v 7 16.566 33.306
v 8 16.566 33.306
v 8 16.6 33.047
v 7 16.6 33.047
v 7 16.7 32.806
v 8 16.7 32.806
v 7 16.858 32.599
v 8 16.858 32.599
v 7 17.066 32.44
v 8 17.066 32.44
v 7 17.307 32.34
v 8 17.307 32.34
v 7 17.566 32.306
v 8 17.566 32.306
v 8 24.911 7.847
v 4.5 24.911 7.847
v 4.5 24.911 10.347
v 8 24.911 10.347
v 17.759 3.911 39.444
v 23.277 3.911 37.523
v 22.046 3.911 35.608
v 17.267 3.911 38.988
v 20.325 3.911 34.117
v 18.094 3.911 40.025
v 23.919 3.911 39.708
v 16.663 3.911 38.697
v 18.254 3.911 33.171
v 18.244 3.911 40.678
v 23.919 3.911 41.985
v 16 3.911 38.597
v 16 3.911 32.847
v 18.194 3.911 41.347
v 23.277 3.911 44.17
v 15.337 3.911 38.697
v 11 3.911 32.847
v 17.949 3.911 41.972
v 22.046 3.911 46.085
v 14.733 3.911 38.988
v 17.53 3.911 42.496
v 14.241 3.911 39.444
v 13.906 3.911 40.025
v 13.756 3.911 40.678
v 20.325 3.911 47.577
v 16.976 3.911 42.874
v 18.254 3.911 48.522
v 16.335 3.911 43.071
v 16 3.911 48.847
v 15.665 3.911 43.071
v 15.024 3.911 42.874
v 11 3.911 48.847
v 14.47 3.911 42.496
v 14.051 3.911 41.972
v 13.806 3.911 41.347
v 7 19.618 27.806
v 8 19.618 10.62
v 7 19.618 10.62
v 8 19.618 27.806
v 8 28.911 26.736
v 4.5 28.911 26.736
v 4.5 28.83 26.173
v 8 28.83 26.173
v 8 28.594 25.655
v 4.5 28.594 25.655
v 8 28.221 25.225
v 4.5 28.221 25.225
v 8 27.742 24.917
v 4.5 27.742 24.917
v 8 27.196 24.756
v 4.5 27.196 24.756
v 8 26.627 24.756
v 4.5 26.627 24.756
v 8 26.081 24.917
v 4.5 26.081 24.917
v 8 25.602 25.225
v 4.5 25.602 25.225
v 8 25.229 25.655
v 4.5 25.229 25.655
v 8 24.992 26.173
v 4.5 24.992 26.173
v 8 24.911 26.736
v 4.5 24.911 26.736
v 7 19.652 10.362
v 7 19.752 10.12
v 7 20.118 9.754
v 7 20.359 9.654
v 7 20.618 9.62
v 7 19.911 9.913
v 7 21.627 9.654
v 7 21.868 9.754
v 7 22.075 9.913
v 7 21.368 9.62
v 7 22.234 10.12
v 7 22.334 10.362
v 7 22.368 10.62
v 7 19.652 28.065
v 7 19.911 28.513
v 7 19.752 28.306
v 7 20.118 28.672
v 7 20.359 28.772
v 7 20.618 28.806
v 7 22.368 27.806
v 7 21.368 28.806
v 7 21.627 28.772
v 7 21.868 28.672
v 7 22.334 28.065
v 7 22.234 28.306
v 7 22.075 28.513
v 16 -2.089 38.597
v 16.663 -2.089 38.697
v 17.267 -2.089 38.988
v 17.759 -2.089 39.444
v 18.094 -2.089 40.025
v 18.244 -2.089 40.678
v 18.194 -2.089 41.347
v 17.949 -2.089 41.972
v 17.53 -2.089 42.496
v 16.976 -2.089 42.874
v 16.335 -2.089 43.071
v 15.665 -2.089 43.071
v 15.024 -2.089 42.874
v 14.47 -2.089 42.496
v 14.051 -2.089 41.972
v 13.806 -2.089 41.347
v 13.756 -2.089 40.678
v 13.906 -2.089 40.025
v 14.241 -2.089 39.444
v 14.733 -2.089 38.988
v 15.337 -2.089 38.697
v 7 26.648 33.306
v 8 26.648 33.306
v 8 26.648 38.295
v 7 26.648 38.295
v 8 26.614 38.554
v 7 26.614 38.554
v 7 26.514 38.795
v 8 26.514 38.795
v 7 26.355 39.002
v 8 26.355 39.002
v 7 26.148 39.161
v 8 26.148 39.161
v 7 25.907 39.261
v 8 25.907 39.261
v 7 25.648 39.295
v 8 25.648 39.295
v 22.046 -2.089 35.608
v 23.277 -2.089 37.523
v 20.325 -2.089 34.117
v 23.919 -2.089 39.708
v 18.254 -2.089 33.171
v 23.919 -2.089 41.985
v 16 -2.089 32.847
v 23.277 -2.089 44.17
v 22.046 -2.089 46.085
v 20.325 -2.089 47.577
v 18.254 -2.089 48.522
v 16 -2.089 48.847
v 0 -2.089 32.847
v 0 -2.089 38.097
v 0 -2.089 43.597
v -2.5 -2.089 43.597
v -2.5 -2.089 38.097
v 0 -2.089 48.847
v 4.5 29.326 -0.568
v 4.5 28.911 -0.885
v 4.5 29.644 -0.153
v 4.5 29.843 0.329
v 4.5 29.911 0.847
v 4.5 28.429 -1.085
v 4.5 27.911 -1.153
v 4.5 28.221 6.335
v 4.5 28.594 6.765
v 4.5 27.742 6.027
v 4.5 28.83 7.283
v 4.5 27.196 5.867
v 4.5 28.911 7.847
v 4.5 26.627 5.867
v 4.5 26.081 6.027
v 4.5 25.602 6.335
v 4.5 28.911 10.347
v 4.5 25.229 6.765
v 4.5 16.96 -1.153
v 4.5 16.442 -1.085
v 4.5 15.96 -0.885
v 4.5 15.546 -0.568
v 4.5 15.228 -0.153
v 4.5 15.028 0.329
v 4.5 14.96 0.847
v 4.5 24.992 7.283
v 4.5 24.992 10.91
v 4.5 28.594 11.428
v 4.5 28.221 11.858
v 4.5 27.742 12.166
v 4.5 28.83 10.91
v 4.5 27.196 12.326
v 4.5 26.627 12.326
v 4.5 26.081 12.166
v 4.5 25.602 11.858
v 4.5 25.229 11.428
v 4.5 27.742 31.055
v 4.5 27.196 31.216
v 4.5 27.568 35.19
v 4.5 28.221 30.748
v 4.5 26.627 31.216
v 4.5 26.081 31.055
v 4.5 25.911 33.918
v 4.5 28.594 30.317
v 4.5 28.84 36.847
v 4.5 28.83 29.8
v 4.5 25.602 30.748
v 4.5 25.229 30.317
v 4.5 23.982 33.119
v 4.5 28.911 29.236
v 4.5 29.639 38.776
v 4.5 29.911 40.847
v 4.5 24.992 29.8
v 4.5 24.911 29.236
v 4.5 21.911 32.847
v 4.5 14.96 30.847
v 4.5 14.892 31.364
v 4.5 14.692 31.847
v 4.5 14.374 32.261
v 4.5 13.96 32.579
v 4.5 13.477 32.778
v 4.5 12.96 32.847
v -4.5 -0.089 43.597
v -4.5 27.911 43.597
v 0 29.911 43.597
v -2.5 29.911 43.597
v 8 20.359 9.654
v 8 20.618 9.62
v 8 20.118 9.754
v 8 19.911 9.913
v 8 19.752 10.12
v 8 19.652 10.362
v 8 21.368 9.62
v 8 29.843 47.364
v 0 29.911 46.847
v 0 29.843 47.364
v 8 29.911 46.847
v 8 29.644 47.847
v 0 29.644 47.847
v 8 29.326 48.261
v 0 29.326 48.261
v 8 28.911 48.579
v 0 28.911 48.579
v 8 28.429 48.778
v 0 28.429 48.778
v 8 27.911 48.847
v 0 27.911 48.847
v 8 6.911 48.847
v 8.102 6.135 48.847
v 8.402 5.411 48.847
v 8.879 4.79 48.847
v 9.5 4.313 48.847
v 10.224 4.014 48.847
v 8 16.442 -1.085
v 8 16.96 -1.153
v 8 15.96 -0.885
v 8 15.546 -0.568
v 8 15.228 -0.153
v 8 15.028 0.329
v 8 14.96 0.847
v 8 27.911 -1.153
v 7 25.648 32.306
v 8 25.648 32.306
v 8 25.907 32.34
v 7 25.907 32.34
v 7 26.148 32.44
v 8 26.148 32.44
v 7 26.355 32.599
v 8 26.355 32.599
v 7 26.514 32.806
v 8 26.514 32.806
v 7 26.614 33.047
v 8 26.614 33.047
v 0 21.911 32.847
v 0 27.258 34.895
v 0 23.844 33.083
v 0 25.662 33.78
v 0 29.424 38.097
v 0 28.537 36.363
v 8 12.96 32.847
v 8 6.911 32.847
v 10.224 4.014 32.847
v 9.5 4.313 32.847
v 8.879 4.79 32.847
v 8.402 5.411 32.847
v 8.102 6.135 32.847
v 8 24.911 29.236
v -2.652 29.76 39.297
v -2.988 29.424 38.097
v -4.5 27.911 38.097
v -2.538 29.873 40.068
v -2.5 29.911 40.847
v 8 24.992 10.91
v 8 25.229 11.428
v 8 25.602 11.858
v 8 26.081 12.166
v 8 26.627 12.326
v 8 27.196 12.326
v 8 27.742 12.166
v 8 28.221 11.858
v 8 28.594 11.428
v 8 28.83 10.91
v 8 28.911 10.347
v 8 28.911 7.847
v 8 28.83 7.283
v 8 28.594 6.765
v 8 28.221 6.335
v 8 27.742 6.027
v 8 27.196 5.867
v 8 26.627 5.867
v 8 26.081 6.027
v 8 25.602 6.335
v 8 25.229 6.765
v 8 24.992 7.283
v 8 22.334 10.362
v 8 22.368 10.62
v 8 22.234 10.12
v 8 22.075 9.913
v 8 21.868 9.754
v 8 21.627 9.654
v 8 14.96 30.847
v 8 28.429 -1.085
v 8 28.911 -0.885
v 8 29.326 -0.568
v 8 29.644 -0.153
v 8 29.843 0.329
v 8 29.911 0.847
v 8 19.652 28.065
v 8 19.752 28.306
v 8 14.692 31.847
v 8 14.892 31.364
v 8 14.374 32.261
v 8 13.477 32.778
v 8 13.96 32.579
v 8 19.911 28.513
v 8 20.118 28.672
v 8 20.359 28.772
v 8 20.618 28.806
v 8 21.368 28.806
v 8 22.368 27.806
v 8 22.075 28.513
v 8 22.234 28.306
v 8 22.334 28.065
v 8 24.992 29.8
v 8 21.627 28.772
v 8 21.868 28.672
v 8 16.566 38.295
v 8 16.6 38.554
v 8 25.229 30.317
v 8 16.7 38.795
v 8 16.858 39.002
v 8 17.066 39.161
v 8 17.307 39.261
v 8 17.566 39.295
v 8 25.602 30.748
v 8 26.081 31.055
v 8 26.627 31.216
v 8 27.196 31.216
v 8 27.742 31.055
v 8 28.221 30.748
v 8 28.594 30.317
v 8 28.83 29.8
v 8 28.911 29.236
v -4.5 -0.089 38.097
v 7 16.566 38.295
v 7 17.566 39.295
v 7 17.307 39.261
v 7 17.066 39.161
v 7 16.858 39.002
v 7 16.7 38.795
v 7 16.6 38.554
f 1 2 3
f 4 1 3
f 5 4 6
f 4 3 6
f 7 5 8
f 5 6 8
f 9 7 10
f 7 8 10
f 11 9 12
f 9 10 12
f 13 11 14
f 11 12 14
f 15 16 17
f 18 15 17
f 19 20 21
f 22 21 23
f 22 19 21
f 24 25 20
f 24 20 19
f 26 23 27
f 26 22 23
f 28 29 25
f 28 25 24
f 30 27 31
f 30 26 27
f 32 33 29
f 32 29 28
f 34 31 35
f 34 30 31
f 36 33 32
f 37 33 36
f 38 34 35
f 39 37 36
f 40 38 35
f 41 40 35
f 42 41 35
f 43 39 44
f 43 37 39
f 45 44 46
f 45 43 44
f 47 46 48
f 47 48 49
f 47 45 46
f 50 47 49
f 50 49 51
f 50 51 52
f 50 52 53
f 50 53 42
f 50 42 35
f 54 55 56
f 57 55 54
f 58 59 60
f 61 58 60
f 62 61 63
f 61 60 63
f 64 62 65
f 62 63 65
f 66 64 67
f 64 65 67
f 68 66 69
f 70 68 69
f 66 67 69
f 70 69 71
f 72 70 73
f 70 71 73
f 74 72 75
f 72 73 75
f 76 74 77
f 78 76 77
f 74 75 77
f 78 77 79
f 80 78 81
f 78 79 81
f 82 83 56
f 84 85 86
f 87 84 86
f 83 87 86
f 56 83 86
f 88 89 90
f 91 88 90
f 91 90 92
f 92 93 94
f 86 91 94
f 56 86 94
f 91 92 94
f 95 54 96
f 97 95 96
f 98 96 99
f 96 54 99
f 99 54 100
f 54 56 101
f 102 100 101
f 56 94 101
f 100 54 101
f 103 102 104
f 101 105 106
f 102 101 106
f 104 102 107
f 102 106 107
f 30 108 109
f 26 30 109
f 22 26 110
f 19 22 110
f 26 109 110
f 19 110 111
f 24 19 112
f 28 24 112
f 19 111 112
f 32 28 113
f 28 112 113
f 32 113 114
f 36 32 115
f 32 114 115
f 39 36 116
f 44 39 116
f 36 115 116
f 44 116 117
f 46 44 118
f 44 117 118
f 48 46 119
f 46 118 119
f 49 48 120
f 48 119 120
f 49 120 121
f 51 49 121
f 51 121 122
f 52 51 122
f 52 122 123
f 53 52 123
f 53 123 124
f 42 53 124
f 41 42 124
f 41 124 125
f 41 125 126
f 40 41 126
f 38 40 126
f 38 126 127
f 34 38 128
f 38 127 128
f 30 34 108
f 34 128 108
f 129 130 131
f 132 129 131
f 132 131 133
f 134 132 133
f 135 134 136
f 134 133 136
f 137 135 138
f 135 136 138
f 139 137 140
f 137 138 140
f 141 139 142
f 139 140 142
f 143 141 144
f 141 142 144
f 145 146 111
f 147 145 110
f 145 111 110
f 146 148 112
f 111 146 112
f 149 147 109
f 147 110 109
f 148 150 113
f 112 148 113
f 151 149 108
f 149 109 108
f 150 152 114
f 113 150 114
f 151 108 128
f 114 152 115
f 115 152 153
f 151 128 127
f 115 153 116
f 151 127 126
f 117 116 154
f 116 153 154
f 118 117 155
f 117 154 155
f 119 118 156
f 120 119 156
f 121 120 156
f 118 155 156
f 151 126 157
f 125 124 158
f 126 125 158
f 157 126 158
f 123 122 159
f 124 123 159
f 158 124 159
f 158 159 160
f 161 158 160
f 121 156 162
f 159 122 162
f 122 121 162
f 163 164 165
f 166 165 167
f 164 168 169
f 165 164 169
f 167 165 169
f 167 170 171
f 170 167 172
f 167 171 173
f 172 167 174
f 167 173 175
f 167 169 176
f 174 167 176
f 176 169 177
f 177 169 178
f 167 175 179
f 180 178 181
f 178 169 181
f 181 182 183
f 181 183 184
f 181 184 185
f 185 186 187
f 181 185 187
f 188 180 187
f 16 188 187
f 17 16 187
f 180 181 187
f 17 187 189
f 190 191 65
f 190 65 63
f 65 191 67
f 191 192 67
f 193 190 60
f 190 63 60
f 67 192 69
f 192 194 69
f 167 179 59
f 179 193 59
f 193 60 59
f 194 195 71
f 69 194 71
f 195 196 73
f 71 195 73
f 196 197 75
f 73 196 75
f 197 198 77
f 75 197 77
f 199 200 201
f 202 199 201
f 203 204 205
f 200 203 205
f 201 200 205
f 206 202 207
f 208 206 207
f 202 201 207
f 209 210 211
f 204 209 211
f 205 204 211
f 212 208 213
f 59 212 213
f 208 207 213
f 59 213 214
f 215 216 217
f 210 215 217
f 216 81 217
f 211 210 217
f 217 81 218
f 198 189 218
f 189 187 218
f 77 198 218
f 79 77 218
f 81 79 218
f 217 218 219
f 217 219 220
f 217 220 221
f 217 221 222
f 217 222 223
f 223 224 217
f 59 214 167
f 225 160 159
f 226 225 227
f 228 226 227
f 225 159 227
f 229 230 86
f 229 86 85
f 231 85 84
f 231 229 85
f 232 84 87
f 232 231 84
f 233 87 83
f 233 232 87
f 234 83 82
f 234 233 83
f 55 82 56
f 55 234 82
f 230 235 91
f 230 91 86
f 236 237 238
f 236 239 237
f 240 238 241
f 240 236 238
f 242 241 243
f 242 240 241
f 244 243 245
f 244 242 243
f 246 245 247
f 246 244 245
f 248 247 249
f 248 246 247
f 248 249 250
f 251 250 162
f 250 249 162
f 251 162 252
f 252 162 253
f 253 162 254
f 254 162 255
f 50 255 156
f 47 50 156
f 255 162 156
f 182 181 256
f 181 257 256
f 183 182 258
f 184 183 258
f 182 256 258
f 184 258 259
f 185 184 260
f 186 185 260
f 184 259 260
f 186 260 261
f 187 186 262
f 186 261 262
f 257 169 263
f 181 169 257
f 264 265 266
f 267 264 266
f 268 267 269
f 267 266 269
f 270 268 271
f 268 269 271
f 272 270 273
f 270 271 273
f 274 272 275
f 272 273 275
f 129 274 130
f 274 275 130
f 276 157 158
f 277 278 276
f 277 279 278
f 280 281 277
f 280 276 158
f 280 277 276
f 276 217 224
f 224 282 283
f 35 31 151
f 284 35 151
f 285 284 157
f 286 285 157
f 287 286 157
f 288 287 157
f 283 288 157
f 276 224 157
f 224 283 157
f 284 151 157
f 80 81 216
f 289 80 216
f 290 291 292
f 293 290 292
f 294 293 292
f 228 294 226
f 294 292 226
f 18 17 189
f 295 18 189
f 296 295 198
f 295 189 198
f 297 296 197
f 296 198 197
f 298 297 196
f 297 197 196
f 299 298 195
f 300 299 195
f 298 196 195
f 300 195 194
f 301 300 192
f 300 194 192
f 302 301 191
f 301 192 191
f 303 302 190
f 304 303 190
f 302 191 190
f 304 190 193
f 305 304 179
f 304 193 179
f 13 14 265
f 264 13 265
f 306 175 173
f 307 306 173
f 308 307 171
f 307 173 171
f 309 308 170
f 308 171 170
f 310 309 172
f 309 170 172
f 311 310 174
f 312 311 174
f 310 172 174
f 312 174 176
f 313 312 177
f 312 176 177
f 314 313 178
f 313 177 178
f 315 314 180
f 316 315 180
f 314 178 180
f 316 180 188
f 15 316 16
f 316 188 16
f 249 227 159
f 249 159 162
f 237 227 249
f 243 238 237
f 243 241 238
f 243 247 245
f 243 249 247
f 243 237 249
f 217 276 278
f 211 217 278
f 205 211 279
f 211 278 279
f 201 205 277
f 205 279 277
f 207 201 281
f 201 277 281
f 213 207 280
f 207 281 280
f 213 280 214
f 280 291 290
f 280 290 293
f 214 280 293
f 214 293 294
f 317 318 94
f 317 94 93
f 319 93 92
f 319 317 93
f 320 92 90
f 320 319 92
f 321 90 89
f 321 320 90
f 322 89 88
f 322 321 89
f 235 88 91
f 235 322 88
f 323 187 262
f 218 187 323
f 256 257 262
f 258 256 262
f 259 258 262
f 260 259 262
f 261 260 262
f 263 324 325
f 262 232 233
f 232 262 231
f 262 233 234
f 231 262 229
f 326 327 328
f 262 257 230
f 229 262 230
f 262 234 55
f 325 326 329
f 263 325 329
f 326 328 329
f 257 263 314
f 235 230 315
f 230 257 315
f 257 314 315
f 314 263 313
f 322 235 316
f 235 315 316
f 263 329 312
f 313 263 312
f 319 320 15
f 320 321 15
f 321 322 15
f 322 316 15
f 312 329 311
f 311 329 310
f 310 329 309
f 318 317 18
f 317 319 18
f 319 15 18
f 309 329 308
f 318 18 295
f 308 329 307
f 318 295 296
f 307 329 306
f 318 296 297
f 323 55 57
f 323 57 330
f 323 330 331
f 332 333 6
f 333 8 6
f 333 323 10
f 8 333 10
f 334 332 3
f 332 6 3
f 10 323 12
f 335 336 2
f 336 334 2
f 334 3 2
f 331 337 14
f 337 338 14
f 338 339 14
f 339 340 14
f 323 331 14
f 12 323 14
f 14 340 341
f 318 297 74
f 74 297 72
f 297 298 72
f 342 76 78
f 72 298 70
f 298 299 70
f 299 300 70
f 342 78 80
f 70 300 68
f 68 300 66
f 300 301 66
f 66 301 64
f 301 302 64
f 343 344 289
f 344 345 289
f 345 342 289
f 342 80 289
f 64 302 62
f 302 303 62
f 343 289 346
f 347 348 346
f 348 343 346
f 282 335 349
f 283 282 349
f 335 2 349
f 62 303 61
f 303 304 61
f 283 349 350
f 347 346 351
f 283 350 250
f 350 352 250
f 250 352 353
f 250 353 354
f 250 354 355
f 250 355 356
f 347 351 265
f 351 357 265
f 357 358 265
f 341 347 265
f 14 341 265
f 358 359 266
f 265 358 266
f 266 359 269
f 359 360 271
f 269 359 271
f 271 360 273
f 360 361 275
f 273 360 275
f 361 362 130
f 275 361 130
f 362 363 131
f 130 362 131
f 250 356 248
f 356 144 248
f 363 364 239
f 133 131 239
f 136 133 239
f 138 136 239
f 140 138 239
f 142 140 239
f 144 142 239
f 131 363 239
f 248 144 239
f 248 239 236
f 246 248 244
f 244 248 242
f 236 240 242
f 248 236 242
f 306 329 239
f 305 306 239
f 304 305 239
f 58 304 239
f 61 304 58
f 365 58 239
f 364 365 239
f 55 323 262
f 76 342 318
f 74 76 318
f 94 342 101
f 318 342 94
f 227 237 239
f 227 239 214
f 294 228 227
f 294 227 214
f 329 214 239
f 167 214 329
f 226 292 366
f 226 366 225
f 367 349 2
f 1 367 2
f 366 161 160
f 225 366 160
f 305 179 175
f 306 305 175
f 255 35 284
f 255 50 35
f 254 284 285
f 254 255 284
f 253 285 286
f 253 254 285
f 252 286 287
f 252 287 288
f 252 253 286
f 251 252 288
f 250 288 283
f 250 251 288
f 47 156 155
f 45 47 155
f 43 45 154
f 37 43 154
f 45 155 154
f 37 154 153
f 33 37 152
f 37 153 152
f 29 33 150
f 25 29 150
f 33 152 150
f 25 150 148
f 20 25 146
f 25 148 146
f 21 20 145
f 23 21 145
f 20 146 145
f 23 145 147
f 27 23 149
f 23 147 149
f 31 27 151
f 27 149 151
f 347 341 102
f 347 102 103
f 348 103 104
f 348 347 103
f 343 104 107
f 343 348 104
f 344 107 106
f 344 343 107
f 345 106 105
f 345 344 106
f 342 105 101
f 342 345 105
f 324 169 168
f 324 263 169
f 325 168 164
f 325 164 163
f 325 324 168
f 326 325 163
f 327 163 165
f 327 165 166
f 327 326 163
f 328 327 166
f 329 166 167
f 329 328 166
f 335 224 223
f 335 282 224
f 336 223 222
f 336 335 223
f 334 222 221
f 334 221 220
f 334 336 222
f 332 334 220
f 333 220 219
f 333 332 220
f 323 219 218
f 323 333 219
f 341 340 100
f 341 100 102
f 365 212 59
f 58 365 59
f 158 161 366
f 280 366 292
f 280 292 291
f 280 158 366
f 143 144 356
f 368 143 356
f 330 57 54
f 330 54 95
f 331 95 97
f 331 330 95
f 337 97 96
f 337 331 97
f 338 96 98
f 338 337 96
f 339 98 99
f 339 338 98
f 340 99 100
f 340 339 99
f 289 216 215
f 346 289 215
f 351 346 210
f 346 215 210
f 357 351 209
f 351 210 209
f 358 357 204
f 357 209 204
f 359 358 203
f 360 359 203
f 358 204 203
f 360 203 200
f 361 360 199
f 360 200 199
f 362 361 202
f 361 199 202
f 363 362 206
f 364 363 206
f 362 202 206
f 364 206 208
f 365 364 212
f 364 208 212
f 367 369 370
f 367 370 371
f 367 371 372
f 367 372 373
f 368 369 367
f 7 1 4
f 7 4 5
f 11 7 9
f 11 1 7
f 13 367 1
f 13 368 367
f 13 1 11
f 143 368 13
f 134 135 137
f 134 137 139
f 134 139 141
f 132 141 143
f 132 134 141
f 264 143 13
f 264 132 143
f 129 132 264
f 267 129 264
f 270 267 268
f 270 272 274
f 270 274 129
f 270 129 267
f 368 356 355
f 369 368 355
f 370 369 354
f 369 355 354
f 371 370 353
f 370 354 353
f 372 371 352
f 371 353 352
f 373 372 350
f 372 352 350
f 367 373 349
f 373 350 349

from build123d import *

# Parameters (mm, degrees)
BOSS_EXTRUDE1_DEPTH = 8
SKETCH2_W           = 5.5
SKETCH2_H           = 32
BOSS_EXTRUDE2_DEPTH = 4.5
CUT_EXTRUDE2_DEPTH  = 1
SKETCH5_W           = 4.5
SKETCH5_H           = 34
CUT_EXTRUDE3_DEPTH  = 53.351043088
FILLET4_R           = 2
CHAMFER1_SIZE       = 2
SKETCH6_R           = 2.25
BOSS_EXTRUDE3_DEPTH = 6
FILLET5_R           = 8
FILLET6_R           = 3


with BuildPart() as part:
    # Sketch1 → Boss-Extrude1 (new body)
    with BuildSketch(Plane(origin=(0, 0, 0), x_dir=(0, 0, -1), z_dir=(1, 0, 0))):
        Polygon((-32.846556001, 14.959797641), (-32.846556001, -2.08853598), (-48.846556001, -2.08853598), (-48.846556001, 29.91146402), (1.153443999, 29.91146402), (1.153443999, 14.959797641), align=None)
        with BuildLine():
            Line((-29.23609438, 28.91146402), (-26.73609438, 28.91146402))
            ThreePointArc((-26.73609438, 28.91146402), (-24.73609438, 26.91146402), (-26.73609438, 24.91146402))
            Line((-26.73609438, 24.91146402), (-29.23609438, 24.91146402))
            ThreePointArc((-29.23609438, 24.91146402), (-31.23609438, 26.91146402), (-29.23609438, 28.91146402))
        make_face(mode=Mode.SUBTRACT)
        with BuildLine():
            Line((-10.346556001, 28.91146402), (-7.846556001, 28.91146402))
            ThreePointArc((-7.846556001, 28.91146402), (-5.846556001, 26.91146402), (-7.846556001, 24.91146402))
            Line((-7.846556001, 24.91146402), (-10.346556001, 24.91146402))
            ThreePointArc((-10.346556001, 24.91146402), (-12.346556001, 26.91146402), (-10.346556001, 28.91146402))
        make_face(mode=Mode.SUBTRACT)
    extrude(amount=BOSS_EXTRUDE1_DEPTH)

    # Sketch2 → Boss-Extrude2 (add)
    with BuildSketch(Plane.ZY):
        with Locations((40.846556001, 13.91146402)):
            Rectangle(SKETCH2_W, SKETCH2_H)
    extrude(amount=BOSS_EXTRUDE2_DEPTH)

    # Sketch4 → Cut-Extrude2 (cut)
    with BuildSketch(Plane(origin=(8, 0, 0), x_dir=(0, 0, -1), z_dir=(1, 0, 0))):
        with BuildLine():
            Line((-33.306145699, 26.647879309), (-38.295392652, 26.647879309))
            ThreePointArc((-38.295392652, 26.647879309), (-39.002499434, 26.354986091), (-39.295392652, 25.647879309))
            Line((-39.295392652, 25.647879309), (-39.295392652, 17.565584617))
            ThreePointArc((-39.295392652, 17.565584617), (-39.002499434, 16.858477836), (-38.295392652, 16.565584617))
            Line((-38.295392652, 16.565584617), (-33.306145699, 16.565584617))
            ThreePointArc((-33.306145699, 16.565584617), (-32.599038918, 16.858477836), (-32.306145699, 17.565584617))
            Line((-32.306145699, 17.565584617), (-32.306145699, 25.647879309))
            ThreePointArc((-32.306145699, 25.647879309), (-32.599038918, 26.354986091), (-33.306145699, 26.647879309))
        make_face()
        with BuildLine():
            Line((-27.806359761, 22.368339675), (-10.62033731, 22.368339675))
            ThreePointArc((-10.62033731, 22.368339675), (-9.913230529, 22.075446457), (-9.62033731, 21.368339675))
            Line((-9.62033731, 21.368339675), (-9.62033731, 20.617921417))
            ThreePointArc((-9.62033731, 20.617921417), (-9.913230529, 19.910814636), (-10.62033731, 19.617921417))
            Line((-10.62033731, 19.617921417), (-27.806359761, 19.617921417))
            ThreePointArc((-27.806359761, 19.617921417), (-28.513466542, 19.910814636), (-28.806359761, 20.617921417))
            Line((-28.806359761, 20.617921417), (-28.806359761, 21.368339675))
            ThreePointArc((-28.806359761, 21.368339675), (-28.513466542, 22.075446457), (-27.806359761, 22.368339675))
        make_face()
    extrude(amount=-CUT_EXTRUDE2_DEPTH, mode=Mode.SUBTRACT)

    # Sketch5 → Cut-Extrude3 (cut, through all)
    with BuildSketch(Plane.XZ.offset(-14.959797641)):
        with Locations((2.25, 15.846556001)):
            Rectangle(SKETCH5_W, SKETCH5_H)
    extrude(amount=-CUT_EXTRUDE3_DEPTH, mode=Mode.SUBTRACT)

    # Fillet4
    fillet4_edges = [part.edges().sort_by_distance(p)[0] for p in [
        (6.25, 29.91146402, -1.153443999),
        (6.25, 14.959797641, -1.153443999),
        (6.25, 14.959797641, 32.846556001),
        (4, 29.91146402, 48.846556001),
    ]]
    fillet(fillet4_edges, radius=FILLET4_R)

    # Chamfer1
    chamfer1_edges = [part.edges().sort_by_distance(p)[0] for p in [
        (-4.5, -2.08853598, 40.846556001),
        (-4.5, 29.91146402, 40.846556001),
    ]]
    chamfer(chamfer1_edges, length=CHAMFER1_SIZE)

    # Sketch6 → Boss-Extrude3 (add)
    with BuildSketch(Plane.XZ.offset(2.08853598)):
        with BuildLine():
            Line((8, 48.846556001), (16, 48.846556001))
            ThreePointArc((16, 48.846556001), (24, 40.846556001), (16, 32.846556001))
            Line((16, 32.846556001), (8, 32.846556001))
            Line((8, 32.846556001), (8, 48.846556001))
        make_face()
        with Locations(Location((16, 40.846556001, 0), (0, 0, 270))):
            Circle(SKETCH6_R, mode=Mode.SUBTRACT)
    extrude(amount=-BOSS_EXTRUDE3_DEPTH)

    # Fillet5
    fillet5_edges = [part.edges().sort_by_distance(p)[0] for p in [
        (2.25, 29.91146402, 32.846556001),
    ]]
    fillet(fillet5_edges, radius=FILLET5_R)

    # Fillet6
    fillet6_edges = [part.edges().sort_by_distance(p)[0] for p in [
        (8, 3.91146402, 40.846556001),
    ]]
    fillet(fillet6_edges, radius=FILLET6_R)


solid = part.part
